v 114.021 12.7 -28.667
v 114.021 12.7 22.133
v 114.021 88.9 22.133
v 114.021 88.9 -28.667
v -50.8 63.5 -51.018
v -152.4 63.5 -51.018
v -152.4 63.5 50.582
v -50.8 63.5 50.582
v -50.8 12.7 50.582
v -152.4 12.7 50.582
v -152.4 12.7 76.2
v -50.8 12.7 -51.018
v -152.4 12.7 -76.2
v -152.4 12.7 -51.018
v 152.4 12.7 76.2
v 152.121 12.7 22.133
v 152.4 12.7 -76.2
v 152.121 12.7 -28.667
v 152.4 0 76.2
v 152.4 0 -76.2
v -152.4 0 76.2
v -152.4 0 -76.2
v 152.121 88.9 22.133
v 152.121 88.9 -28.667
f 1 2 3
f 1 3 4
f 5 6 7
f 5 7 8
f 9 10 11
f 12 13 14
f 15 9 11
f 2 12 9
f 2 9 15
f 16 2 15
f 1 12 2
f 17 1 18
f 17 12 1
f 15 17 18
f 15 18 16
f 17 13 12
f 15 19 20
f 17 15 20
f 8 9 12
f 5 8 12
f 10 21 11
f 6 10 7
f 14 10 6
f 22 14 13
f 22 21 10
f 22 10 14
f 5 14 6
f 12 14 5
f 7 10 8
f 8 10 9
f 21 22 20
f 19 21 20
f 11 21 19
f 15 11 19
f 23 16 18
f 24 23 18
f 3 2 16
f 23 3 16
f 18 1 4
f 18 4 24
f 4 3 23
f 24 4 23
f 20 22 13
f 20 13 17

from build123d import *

# Parameters (mm, degrees)
SKETCH1_W           = 304.8
SKETCH1_H           = 152.4
BOSS_EXTRUDE1_DEPTH = 12.7
SKETCH2_W           = 38.1
SKETCH2_H           = 50.8
BOSS_EXTRUDE2_DEPTH = 76.2
SKETCH3_W           = 101.6
SKETCH3_H           = 101.6
BOSS_EXTRUDE3_DEPTH = 50.8


with BuildPart() as part:
    # Sketch1 → Boss-Extrude1 (new body)
    with BuildSketch(Plane(origin=(0, 0, 0), x_dir=(1, 0, 0), z_dir=(0, 1, 0))):
        Rectangle(SKETCH1_W, SKETCH1_H)
    extrude(amount=BOSS_EXTRUDE1_DEPTH)

    # Sketch2 → Boss-Extrude2 (add)
    with BuildSketch(Plane(origin=(0, 12.7, 0), x_dir=(1, 0, 0), z_dir=(0, 1, 0))):
        with Locations((133.070932654, 3.267194716)):
            Rectangle(SKETCH2_W, SKETCH2_H)
    extrude(amount=BOSS_EXTRUDE2_DEPTH)

    # Sketch3 → Boss-Extrude3 (add)
    with BuildSketch(Plane(origin=(0, 12.7, 0), x_dir=(1, 0, 0), z_dir=(0, 1, 0))):
        with Locations((-101.6, 0.217888901)):
            Rectangle(SKETCH3_W, SKETCH3_H)
    extrude(amount=BOSS_EXTRUDE3_DEPTH)


solid = part.part
